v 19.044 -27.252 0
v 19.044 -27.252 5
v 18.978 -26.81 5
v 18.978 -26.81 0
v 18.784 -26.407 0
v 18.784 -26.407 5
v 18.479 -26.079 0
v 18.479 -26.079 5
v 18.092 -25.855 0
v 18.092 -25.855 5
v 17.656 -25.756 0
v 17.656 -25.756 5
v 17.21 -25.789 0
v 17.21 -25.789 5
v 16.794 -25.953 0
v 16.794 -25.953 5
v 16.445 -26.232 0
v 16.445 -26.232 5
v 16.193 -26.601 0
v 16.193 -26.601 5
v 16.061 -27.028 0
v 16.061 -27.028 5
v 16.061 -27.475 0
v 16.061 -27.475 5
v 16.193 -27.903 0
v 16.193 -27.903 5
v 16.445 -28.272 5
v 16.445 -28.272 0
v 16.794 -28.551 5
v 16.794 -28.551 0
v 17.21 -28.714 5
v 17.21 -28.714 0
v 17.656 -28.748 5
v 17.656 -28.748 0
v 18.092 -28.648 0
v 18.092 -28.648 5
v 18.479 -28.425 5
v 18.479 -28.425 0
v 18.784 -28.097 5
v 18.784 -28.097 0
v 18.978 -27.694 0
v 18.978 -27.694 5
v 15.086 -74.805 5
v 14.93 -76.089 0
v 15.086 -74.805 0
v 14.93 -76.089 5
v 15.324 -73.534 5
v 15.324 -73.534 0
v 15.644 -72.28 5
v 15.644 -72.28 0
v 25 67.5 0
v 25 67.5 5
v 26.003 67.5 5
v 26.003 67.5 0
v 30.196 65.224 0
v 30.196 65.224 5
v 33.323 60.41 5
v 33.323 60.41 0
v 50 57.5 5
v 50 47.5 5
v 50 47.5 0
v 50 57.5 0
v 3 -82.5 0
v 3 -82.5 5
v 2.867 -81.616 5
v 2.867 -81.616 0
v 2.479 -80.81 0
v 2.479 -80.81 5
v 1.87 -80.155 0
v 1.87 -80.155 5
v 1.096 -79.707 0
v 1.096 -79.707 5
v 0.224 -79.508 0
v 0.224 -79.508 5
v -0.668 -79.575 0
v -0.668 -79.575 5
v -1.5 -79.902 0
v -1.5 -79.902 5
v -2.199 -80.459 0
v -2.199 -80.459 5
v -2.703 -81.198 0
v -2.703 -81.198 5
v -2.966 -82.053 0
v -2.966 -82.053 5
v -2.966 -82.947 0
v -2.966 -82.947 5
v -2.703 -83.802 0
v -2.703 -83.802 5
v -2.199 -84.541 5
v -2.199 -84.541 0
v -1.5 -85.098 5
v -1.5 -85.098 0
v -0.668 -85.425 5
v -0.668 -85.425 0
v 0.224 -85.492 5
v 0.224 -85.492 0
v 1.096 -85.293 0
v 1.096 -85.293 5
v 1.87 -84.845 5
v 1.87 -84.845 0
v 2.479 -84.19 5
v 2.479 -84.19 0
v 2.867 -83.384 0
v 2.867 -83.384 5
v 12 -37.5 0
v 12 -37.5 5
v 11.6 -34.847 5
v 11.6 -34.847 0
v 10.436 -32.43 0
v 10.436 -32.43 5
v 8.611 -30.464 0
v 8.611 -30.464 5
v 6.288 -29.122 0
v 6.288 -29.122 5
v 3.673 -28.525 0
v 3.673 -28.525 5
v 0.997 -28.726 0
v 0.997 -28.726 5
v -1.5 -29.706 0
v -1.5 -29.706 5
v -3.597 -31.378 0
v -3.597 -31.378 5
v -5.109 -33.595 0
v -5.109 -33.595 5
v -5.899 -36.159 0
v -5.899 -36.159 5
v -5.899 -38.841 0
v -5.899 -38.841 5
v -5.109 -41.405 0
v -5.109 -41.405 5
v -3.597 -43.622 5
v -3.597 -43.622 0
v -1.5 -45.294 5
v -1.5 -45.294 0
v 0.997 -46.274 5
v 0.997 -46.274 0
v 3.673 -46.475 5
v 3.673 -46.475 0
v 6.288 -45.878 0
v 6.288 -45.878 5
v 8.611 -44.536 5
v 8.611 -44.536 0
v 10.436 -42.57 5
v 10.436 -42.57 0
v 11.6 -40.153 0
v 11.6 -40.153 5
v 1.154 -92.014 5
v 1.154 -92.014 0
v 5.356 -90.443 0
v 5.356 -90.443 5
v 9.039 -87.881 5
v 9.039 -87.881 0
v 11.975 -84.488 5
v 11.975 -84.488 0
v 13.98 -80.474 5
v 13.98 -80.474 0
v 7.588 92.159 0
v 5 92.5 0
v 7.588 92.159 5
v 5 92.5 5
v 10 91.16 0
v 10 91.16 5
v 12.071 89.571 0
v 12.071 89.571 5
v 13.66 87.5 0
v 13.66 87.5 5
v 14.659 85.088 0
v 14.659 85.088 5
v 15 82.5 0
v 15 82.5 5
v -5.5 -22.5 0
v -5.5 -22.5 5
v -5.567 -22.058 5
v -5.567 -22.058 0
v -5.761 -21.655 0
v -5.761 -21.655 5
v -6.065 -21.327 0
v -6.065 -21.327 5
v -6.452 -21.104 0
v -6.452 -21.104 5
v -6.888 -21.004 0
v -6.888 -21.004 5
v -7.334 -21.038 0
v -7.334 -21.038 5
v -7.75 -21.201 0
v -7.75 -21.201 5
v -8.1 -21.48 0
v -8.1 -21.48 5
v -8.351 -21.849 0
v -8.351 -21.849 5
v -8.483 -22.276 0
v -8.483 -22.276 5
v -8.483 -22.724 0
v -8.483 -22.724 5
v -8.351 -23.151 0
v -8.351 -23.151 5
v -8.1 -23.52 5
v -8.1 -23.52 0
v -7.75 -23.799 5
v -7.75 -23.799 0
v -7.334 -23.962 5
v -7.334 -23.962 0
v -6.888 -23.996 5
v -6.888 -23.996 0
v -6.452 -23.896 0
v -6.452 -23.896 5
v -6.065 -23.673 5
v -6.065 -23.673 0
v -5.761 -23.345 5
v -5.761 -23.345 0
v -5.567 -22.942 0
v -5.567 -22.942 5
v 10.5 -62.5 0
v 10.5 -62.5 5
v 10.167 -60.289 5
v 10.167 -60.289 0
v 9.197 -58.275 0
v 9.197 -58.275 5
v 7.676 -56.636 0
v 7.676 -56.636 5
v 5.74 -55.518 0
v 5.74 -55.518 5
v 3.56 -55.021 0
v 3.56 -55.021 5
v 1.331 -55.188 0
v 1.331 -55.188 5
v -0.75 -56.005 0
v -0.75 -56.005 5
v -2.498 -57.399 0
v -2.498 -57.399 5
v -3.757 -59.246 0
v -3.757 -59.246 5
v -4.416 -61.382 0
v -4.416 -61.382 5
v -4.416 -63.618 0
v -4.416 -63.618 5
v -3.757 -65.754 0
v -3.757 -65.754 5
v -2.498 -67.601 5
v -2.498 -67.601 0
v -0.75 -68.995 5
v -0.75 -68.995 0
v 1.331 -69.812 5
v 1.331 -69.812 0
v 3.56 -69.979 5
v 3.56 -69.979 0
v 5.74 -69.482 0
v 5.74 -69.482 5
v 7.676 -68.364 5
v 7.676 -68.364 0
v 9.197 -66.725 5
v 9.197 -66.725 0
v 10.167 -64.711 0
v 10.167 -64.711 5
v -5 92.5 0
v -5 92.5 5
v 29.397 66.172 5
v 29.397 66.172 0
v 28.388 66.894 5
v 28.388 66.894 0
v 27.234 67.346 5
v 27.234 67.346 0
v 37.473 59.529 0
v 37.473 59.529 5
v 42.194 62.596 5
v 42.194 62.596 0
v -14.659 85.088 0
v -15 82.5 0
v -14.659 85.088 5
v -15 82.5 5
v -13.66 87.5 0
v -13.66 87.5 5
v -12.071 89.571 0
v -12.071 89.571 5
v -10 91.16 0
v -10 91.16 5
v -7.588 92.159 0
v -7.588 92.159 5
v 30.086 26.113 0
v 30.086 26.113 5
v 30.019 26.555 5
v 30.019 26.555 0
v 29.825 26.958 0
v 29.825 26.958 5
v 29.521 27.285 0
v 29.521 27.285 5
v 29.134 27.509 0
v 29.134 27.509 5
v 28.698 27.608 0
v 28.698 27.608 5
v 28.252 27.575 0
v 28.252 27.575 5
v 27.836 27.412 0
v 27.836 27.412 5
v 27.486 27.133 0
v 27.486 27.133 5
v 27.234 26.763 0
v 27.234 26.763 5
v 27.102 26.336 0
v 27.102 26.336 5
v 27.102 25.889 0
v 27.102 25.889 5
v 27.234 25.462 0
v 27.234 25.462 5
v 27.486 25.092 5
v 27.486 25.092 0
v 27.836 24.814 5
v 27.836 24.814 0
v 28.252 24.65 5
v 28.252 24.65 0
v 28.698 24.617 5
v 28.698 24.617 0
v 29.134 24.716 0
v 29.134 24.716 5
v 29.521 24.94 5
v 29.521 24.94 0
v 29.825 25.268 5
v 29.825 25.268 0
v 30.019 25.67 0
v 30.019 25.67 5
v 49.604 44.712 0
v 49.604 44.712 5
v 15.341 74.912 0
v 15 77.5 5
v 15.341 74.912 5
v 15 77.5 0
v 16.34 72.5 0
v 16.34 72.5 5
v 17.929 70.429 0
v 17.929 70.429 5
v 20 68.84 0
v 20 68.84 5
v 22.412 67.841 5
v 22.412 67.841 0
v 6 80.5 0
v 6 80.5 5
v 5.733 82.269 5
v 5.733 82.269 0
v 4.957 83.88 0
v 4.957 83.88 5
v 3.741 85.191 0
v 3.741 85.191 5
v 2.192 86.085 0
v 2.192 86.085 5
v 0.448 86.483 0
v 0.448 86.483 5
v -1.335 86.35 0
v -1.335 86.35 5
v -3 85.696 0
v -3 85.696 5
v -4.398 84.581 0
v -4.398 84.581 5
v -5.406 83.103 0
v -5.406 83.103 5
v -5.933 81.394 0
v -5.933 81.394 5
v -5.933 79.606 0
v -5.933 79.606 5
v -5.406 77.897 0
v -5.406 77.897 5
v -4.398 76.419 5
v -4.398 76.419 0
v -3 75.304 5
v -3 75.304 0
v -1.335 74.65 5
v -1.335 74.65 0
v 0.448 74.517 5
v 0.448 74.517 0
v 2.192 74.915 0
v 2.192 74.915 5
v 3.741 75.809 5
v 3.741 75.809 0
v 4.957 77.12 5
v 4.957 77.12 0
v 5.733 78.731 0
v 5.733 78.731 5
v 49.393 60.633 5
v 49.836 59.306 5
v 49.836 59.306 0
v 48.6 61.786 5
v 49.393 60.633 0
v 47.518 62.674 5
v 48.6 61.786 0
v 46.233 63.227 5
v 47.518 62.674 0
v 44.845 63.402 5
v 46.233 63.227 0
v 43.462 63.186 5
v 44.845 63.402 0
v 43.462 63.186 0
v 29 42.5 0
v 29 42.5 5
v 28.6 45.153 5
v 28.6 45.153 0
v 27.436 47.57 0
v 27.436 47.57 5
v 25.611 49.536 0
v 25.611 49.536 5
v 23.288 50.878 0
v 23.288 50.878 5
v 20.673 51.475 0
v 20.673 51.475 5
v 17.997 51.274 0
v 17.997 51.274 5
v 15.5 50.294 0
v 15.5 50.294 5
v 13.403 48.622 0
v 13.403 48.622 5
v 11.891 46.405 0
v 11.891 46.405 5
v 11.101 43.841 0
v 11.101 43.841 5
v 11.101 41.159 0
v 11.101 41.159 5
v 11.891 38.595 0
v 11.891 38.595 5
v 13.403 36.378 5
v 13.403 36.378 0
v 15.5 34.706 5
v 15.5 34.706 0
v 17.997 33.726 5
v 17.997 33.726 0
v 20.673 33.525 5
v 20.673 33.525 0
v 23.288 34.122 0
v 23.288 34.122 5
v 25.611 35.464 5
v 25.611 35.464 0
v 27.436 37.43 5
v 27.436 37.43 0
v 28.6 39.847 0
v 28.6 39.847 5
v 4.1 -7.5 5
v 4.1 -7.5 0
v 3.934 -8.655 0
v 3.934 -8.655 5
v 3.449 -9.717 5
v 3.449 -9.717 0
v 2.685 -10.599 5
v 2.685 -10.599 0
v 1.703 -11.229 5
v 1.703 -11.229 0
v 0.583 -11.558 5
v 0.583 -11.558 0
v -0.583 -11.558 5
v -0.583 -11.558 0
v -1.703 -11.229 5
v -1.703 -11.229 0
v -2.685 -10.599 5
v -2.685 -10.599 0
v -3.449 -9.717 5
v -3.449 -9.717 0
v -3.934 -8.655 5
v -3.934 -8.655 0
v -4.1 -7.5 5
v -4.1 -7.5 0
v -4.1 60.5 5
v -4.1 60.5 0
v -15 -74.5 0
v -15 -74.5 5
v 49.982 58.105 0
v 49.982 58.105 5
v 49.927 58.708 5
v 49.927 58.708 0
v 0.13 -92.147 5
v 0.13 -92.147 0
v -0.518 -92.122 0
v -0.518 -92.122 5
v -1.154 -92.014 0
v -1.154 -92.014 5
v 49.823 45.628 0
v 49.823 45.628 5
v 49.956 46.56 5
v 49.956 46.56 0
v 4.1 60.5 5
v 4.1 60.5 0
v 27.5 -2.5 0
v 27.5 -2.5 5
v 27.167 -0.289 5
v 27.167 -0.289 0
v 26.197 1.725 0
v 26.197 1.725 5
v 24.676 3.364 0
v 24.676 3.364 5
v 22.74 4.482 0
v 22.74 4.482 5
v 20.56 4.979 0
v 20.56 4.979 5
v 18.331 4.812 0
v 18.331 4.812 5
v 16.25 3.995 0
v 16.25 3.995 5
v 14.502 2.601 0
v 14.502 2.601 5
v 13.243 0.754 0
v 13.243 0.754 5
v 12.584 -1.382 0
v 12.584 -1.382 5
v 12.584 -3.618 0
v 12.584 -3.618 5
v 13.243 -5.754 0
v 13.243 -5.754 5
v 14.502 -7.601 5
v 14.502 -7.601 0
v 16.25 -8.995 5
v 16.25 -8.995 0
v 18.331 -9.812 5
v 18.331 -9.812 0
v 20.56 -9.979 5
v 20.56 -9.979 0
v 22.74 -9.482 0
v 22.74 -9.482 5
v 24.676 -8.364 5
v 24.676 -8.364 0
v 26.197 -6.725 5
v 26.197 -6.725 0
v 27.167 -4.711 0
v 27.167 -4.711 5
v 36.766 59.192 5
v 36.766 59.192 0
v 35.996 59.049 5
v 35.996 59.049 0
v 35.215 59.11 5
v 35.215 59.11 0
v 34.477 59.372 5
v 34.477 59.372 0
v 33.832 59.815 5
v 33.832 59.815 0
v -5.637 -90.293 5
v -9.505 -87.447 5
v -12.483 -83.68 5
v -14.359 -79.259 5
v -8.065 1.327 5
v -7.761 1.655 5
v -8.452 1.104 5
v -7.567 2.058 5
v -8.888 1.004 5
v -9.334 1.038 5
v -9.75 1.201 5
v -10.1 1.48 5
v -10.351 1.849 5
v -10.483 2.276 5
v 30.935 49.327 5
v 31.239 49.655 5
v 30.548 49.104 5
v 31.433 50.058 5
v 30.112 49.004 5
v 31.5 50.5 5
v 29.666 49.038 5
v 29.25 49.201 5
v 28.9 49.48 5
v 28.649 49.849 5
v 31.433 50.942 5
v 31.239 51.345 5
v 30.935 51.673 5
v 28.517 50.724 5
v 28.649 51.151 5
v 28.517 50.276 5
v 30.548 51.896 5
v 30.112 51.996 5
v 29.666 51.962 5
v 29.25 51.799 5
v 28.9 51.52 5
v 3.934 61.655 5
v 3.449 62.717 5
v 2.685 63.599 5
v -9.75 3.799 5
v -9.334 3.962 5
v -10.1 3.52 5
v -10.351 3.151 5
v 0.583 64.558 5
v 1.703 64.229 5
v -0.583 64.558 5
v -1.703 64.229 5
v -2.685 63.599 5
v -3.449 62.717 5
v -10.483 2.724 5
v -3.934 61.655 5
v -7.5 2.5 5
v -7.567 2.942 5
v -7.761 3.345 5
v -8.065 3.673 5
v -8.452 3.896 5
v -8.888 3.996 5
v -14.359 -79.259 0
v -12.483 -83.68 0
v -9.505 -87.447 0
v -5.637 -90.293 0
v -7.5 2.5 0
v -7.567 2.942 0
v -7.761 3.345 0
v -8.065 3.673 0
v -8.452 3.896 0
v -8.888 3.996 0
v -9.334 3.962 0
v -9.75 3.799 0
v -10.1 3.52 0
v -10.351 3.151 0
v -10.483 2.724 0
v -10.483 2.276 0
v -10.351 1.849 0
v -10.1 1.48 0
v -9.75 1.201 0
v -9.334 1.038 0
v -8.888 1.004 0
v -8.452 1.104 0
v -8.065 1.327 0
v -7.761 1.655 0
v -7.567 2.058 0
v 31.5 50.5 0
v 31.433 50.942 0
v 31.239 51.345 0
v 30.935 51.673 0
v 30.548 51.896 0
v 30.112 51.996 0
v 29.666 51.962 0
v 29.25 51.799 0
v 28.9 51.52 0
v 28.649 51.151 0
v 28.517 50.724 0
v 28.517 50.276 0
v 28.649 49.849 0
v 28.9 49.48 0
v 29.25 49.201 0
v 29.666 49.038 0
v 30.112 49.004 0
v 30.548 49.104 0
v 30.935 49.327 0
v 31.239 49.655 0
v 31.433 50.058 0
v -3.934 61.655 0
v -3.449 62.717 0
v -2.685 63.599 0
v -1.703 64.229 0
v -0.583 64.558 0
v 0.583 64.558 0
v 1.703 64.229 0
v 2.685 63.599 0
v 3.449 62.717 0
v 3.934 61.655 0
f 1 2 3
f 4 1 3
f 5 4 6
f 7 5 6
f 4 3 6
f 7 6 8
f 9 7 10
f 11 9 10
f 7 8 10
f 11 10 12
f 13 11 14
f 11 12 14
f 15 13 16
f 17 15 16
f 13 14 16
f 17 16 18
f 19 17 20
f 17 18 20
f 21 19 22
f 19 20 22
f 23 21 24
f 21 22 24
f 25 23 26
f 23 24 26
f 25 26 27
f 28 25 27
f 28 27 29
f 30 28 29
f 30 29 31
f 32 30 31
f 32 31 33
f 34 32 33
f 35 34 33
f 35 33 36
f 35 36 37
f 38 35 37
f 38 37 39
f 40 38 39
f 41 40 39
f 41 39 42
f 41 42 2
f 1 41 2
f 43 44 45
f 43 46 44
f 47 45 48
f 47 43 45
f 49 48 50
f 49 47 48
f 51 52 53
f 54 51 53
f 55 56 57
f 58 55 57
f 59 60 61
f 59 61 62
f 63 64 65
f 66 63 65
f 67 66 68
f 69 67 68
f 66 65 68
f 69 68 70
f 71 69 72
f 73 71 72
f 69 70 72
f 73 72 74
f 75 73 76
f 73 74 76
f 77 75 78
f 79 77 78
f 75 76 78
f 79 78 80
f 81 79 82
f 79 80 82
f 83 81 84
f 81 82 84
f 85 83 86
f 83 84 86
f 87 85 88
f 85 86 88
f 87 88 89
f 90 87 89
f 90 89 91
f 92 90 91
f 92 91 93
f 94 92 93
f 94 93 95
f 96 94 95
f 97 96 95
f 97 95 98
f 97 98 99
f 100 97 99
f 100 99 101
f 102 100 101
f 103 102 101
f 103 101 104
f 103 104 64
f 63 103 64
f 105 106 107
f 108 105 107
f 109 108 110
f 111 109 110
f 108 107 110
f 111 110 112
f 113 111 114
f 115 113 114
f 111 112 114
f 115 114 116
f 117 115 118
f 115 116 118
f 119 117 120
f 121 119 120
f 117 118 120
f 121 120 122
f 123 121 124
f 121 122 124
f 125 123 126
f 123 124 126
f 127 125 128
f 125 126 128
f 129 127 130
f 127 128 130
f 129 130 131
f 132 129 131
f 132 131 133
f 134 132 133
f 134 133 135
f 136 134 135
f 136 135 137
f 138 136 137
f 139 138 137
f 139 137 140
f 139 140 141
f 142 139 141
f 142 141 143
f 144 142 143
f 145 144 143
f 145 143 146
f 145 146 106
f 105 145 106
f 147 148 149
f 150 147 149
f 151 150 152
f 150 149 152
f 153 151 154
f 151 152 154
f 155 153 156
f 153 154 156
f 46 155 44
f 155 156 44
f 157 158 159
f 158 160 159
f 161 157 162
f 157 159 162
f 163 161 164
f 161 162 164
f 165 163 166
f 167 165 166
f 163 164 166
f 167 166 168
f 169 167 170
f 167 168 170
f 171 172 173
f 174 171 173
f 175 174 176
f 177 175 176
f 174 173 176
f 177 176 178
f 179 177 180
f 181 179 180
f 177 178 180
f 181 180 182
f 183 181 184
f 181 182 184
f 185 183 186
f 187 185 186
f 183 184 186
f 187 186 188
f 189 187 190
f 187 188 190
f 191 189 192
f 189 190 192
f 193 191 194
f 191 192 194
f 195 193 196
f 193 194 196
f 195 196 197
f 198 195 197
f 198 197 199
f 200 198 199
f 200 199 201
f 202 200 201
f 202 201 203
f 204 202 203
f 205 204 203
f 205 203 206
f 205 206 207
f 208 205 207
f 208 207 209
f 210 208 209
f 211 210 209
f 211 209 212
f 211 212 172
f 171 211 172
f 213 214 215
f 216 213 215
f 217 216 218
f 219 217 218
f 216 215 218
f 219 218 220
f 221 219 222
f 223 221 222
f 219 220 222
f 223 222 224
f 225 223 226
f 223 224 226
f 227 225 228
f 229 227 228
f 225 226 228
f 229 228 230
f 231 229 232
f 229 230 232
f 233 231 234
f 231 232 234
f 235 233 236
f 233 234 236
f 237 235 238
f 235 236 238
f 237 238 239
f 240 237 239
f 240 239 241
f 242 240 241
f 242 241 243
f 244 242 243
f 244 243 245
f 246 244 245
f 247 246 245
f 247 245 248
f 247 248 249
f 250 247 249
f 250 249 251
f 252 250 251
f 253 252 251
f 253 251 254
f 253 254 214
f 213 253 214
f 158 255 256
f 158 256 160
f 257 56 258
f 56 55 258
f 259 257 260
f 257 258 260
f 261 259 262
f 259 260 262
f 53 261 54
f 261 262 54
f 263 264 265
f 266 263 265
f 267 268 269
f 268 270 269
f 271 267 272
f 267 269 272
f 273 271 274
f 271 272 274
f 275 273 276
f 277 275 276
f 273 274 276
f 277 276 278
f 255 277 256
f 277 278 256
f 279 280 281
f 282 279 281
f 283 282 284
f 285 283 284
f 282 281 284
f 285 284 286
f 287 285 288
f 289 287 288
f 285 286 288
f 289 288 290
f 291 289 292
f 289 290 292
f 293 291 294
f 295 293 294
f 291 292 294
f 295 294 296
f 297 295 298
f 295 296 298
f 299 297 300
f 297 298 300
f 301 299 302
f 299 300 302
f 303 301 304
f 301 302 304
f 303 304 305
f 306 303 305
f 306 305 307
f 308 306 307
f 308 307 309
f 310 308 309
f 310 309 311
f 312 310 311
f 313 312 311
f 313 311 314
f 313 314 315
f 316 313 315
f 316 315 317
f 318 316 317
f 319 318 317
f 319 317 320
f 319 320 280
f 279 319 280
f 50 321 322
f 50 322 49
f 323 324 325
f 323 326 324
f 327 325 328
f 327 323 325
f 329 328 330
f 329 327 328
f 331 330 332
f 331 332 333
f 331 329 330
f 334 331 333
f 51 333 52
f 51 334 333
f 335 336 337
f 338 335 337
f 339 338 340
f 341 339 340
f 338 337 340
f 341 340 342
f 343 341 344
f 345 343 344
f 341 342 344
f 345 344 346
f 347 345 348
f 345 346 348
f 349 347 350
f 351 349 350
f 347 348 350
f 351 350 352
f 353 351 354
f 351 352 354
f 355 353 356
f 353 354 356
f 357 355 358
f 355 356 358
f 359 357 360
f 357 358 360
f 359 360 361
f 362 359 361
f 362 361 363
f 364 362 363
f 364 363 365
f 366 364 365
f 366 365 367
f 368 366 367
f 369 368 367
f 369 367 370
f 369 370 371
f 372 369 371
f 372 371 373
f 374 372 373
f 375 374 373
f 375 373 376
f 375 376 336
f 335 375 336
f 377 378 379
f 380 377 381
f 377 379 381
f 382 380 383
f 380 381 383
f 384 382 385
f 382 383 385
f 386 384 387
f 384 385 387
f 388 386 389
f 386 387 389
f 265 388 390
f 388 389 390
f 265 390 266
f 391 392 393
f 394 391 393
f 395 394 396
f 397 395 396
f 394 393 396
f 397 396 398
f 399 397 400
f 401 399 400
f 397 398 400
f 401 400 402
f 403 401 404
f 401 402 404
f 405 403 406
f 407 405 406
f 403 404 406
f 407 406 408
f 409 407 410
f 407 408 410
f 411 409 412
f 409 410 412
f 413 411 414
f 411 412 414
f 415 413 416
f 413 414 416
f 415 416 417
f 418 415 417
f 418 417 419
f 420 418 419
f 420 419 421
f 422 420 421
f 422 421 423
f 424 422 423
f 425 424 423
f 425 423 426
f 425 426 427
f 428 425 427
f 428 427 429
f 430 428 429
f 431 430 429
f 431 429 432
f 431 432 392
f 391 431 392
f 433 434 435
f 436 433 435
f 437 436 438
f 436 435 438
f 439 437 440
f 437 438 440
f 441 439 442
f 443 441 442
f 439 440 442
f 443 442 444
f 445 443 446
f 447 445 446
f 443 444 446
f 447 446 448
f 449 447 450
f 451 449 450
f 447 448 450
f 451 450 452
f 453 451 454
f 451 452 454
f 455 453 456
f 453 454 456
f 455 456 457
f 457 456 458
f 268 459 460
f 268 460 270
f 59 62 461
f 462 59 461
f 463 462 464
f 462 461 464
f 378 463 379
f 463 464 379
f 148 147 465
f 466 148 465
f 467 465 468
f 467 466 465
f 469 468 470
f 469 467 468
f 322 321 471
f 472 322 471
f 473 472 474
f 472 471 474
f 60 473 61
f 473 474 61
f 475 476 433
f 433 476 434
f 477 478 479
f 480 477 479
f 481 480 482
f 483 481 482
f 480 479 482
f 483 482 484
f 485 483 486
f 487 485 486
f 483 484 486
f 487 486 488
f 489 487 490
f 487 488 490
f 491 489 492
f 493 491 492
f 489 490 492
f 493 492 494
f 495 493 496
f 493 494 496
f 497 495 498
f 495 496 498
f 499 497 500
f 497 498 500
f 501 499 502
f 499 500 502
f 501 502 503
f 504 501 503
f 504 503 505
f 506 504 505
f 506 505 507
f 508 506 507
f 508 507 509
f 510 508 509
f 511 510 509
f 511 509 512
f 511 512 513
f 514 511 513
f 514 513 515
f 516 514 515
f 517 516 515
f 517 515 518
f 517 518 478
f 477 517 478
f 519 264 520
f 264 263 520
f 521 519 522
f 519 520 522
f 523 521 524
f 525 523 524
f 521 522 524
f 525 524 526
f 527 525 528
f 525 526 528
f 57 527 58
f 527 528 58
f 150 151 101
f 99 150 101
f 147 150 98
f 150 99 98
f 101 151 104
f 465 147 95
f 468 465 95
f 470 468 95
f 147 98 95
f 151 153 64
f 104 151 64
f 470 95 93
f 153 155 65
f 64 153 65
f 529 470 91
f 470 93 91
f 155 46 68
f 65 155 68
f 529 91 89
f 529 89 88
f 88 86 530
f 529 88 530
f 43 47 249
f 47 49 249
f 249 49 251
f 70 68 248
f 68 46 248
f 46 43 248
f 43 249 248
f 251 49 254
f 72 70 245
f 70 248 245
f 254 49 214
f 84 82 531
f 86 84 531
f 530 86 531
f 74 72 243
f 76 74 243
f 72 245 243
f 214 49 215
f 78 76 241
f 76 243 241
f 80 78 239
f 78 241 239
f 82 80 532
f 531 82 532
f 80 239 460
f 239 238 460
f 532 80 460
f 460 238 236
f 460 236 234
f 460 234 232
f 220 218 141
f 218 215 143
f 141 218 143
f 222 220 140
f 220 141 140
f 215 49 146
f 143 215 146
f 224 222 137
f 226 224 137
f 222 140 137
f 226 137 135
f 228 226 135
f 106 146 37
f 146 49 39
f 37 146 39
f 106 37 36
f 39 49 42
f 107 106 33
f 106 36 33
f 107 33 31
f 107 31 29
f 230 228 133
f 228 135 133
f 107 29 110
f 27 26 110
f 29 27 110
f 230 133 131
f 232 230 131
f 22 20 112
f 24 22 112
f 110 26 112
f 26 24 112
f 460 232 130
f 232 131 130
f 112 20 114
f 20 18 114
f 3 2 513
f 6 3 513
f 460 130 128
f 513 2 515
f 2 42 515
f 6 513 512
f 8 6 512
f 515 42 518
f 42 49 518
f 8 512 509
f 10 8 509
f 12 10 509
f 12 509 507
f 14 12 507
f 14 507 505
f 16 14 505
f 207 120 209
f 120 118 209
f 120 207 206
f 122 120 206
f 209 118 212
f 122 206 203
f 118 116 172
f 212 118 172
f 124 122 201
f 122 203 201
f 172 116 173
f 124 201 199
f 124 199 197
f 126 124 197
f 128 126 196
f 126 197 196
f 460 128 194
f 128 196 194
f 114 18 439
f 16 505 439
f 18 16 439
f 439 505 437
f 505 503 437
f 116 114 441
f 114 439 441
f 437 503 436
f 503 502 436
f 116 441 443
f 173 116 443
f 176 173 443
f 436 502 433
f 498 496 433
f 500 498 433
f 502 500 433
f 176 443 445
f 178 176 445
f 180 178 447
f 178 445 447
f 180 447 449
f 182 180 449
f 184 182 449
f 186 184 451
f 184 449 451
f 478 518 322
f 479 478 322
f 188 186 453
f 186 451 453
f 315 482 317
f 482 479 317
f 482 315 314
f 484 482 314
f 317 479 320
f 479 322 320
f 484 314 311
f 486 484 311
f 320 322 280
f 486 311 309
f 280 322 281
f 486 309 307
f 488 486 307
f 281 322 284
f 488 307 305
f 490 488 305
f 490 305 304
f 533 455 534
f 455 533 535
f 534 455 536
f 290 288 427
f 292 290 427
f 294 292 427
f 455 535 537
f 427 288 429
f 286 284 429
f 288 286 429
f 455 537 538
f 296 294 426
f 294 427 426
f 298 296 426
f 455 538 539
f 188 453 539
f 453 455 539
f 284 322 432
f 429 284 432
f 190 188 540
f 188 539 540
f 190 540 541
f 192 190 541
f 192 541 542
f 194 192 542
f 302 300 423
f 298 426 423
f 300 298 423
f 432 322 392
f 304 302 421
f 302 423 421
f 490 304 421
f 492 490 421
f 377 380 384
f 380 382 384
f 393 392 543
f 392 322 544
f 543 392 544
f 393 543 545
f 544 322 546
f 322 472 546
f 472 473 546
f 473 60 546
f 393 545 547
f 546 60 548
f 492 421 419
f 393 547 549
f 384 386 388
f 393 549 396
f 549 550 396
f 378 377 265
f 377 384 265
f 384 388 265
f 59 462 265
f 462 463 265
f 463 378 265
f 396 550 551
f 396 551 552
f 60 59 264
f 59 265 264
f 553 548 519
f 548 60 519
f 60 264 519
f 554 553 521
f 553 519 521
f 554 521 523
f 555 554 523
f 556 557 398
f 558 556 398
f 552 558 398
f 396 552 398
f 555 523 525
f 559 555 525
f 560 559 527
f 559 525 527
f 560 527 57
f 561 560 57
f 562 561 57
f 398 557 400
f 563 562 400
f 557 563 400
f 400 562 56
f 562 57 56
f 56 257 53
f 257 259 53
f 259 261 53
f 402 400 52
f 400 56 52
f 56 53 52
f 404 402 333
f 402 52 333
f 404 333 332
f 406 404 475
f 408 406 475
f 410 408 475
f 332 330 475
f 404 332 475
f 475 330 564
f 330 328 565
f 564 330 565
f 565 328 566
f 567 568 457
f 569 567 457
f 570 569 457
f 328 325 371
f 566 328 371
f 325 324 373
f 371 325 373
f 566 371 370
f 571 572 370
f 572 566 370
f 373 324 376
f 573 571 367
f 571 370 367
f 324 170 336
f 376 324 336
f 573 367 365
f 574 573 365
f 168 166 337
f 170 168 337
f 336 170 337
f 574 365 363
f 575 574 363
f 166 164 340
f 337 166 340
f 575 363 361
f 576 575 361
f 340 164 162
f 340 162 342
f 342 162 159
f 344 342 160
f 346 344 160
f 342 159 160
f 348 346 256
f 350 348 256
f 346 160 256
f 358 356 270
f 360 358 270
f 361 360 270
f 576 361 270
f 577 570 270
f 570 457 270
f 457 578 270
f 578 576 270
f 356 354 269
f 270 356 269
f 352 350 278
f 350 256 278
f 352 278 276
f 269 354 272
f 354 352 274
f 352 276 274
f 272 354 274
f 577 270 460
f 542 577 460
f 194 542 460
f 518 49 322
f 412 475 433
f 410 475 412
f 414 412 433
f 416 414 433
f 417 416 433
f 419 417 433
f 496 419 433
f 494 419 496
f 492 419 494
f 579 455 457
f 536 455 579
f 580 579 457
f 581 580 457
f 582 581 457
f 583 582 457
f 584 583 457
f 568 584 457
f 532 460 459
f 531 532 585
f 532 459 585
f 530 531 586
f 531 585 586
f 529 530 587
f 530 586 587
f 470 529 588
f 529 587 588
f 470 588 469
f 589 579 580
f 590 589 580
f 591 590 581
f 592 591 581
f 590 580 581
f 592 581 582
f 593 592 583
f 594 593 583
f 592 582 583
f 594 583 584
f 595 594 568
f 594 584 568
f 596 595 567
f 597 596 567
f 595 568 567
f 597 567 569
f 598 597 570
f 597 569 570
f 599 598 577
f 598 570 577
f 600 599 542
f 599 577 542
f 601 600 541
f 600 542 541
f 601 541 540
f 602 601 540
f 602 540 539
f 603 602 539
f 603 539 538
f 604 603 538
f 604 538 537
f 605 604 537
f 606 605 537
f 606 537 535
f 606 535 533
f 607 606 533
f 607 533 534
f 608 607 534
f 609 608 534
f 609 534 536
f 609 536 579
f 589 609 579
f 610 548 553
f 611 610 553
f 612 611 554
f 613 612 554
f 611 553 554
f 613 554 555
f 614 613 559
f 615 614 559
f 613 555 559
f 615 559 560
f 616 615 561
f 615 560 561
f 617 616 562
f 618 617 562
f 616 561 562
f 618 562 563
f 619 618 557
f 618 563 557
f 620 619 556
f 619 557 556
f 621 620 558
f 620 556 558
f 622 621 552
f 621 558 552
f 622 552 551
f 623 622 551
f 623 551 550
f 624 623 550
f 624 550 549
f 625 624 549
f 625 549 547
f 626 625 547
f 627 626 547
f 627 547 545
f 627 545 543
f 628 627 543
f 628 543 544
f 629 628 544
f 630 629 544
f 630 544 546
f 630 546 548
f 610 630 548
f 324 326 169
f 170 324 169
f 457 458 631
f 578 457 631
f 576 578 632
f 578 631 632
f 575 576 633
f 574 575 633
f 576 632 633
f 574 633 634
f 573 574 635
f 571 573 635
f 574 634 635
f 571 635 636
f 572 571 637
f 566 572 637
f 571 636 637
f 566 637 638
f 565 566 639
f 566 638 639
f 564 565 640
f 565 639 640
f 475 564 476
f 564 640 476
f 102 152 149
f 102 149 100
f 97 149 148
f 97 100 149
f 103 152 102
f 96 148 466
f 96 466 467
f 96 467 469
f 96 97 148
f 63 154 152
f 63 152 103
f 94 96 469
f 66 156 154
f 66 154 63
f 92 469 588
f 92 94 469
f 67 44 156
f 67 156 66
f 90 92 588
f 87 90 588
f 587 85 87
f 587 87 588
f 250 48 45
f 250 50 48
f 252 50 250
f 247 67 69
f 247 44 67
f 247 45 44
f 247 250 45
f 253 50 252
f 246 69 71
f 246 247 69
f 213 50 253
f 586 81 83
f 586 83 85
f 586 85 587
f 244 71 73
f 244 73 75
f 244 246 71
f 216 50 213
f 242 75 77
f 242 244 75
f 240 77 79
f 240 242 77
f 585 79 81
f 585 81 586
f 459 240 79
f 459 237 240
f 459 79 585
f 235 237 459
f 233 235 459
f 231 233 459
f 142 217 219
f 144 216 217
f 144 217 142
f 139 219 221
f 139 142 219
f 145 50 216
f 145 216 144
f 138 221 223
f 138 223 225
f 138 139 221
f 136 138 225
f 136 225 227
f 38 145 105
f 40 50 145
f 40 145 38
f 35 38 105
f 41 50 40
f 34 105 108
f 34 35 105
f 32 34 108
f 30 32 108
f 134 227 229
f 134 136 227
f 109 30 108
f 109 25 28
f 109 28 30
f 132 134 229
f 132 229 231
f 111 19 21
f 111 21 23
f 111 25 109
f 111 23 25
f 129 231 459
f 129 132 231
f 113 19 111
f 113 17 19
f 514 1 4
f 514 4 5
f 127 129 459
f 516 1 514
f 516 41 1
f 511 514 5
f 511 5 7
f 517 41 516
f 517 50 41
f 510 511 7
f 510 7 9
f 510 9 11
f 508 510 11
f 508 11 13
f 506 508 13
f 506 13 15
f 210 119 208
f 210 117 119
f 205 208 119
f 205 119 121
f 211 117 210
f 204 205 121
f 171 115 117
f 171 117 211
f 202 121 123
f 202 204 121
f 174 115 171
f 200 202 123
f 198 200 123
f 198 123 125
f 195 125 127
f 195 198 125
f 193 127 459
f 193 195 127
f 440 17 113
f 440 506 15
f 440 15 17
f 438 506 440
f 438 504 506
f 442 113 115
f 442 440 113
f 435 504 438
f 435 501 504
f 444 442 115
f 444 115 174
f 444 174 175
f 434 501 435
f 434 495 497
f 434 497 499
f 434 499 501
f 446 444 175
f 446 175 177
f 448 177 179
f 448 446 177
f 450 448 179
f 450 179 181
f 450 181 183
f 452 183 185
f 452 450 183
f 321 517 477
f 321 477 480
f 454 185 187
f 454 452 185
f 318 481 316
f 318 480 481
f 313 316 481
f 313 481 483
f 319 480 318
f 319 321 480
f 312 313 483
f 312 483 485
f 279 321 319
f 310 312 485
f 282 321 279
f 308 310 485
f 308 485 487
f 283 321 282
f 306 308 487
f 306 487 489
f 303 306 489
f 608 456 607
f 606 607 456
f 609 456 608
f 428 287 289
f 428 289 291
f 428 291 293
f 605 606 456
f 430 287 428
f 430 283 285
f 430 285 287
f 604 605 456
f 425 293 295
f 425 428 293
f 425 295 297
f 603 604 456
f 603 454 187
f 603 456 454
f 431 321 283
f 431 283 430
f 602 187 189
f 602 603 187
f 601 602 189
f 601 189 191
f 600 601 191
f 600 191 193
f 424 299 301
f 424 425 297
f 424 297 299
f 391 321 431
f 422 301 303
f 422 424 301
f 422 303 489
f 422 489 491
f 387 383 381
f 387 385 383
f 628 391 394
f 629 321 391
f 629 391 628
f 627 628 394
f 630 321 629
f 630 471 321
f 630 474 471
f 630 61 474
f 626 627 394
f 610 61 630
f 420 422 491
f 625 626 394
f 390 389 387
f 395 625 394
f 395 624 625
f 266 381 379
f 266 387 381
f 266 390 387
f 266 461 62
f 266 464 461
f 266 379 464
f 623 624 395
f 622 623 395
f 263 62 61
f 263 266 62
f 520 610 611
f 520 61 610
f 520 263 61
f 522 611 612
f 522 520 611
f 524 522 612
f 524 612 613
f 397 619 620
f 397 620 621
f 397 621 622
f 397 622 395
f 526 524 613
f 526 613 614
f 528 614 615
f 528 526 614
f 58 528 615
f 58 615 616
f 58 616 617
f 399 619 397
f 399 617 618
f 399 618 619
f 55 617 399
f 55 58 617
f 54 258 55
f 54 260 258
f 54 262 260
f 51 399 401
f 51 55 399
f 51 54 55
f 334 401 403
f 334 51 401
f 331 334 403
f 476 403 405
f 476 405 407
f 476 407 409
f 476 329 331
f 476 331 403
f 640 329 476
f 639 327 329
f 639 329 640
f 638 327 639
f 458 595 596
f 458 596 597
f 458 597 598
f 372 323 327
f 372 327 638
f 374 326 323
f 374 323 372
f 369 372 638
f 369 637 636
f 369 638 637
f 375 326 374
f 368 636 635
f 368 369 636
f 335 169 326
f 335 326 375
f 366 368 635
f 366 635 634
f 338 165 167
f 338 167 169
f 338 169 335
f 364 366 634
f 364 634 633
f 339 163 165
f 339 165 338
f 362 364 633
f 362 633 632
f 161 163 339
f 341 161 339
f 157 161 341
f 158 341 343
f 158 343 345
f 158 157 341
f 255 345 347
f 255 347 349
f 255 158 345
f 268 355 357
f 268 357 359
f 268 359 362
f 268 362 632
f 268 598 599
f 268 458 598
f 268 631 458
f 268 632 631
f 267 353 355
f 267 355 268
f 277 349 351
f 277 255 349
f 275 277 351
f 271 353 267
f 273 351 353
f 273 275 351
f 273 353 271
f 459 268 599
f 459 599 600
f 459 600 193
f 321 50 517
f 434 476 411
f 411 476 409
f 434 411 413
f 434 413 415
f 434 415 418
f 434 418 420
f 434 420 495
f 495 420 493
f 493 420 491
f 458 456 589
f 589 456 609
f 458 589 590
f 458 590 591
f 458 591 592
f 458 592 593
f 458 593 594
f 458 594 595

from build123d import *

# Parameters (mm, degrees)
SKETCH_1_W          = 30
SKETCH_1_H          = 185
EXTRUDE_1_DEPTH     = 5
SKETCH_2_R          = 6
SKETCH_2_R_2        = 3
CUT_EXTRUDE_1_DEPTH = 94.841621896
FILLET_1_R          = 10
SKETCH_5_W          = 35
SKETCH_5_H          = 30
EXTRUDE_3_DEPTH     = 5
FILLET_4_R          = 10
FILLET_5_R          = 18
CUT_EXTRUDE_3_DEPTH = 5
CUT_EXTRUDE_4_DEPTH = 5
EXTRUDE_START       = -5
EXTRUDE_5_DEPTH     = 5
SKETCH_11_R         = 1.5
CUT_EXTRUDE_5_DEPTH = 106.267516357
SKETCH_12_R         = 9
SKETCH_12_R_2       = 7.5
CUT_EXTRUDE_6_DEPTH = 106.267516357
CUT_EXTRUDE_7_DEPTH = 106.267516357
FILLET_9_R          = 5
FILLET_10_R         = 3
FILLET_11_R         = 5
FILLET_12_R         = 20


with BuildPart() as part:
    # 草图1 → 凸台-拉伸1 (new body)
    with BuildSketch(Plane.XY):
        Rectangle(SKETCH_1_W, SKETCH_1_H)
    extrude(amount=EXTRUDE_1_DEPTH)

    # 草图2 → 切除-拉伸1 (cut, through all)
    with BuildSketch(Plane.XY.offset(5)):
        with Locations((0, 80.5)):
            Circle(SKETCH_2_R)
        with Locations((0, -82.5)):
            Circle(SKETCH_2_R_2)
    extrude(amount=-CUT_EXTRUDE_1_DEPTH, mode=Mode.SUBTRACT)

    # 圆角1
    fillet_1_edges = [part.edges().sort_by_distance(p)[0] for p in [
        (-15, 92.5, 2.5),
        (15, 92.5, 2.5),
    ]]
    fillet(fillet_1_edges, radius=FILLET_1_R)

    # 草图5 → 凸台-拉伸3 (add)
    with BuildSketch(Plane.XY.offset(5)):
        with Locations((32.5, 52.5)):
            Rectangle(SKETCH_5_W, SKETCH_5_H)
    extrude(amount=-EXTRUDE_3_DEPTH)

    # 圆角4
    fillet_4_edges = [part.edges().sort_by_distance(p)[0] for p in [
        (15, 37.5, 2.5),
        (15, 67.5, 2.5),
        (50, 67.5, 2.5),
        (50, 37.5, 2.5),
    ]]
    fillet(fillet_4_edges, radius=FILLET_4_R)

    # 圆角5
    # the kernel refuses this fillet: 18 mm, written as the material it takes off along each edge
    with BuildSketch(Plane(origin=(-15, -92.5, -45), x_dir=(0, 1, 0), z_dir=(0, 0, 1)), Plane(origin=(15, -92.5, -45), x_dir=(-1, 0, 0), z_dir=(0, 0, 1))) as fillet_5_piece_1:
        with BuildLine():
            CenterArc((FILLET_5_R, -FILLET_5_R), FILLET_5_R, 90, 90)
            Line((0, -FILLET_5_R), (0, 0))
            Line((0, 0), (FILLET_5_R, 0))
        make_face()
    extrude(amount=95, mode=Mode.SUBTRACT)

    # 草图8 → 切除-拉伸3 (cut)
    with BuildSketch(Plane(origin=(0, 0, 0), x_dir=(-1, 0, 0), z_dir=(0, 0, -1))):
        with BuildLine():
            Line((-4.1, 60.5), (-4.1, -7.5))
            ThreePointArc((-4.1, -7.5), (0, -11.6), (4.1, -7.5))
            Line((4.1, -7.5), (4.1, 60.5))
            ThreePointArc((4.1, 60.5), (0, 64.6), (-4.1, 60.5))
        make_face()
    extrude(amount=-CUT_EXTRUDE_3_DEPTH, mode=Mode.SUBTRACT)

    # 草图9 → 切除-拉伸4 (cut)
    with BuildSketch(Plane.XY.offset(5)):
        Polygon((22.949354722, 80.050183125), (35, 61.5), (47.495924497, 69.617653207), align=None)
    extrude(amount=-CUT_EXTRUDE_4_DEPTH, mode=Mode.SUBTRACT)

    # 草图10 → 凸台-拉伸5 (add)
    with BuildSketch(Plane.XY.offset(5).offset(EXTRUDE_START)):
        with BuildLine():
            Line((25, 37.5), (40, 37.5))
            ThreePointArc((40, 37.5), (46.005154783, 39.503868684), (49.603601244, 44.712376794))
            Line((49.603601244, 44.712376794), (15, -74.5))
            Line((15, -74.5), (15, 27.5))
            ThreePointArc((15, 27.5), (17.928932188, 34.571067812), (25, 37.5))
        make_face()
    extrude(amount=EXTRUDE_5_DEPTH)

    # 草图11 → 切除-拉伸5 (cut, through all)
    with BuildSketch(Plane.XY.offset(5)):
        with Locations((-7, -22.5)):
            Circle(SKETCH_11_R)
        with Locations((17.544259481, -27.251770883)):
            Circle(SKETCH_11_R)
        with Locations((18.828850642, -7.5)):
            Circle(SKETCH_11_R)
        with Locations((28.585531862, 26.112604356)):
            Circle(SKETCH_11_R)
        with Locations((30, 50.5)):
            Circle(SKETCH_11_R)
        with Locations((-9, 2.5)):
            Circle(SKETCH_11_R)
    extrude(amount=-CUT_EXTRUDE_5_DEPTH, mode=Mode.SUBTRACT)

    # 草图12 → 切除-拉伸6 (cut, through all)
    with BuildSketch(Plane.XY.offset(5)):
        with Locations((20, 42.5)):
            Circle(SKETCH_12_R)
        with Locations((20, -2.5)):
            Circle(SKETCH_12_R_2)
        with Locations((3, -37.5)):
            Circle(SKETCH_12_R)
        with Locations((3, -62.5)):
            Circle(SKETCH_12_R_2)
    extrude(amount=-CUT_EXTRUDE_6_DEPTH, mode=Mode.SUBTRACT)

    # 草图13 → 切除-拉伸7 (cut, through all)
    with BuildSketch(Plane.XY.offset(5)):
        Polygon((22.804344395, 76.602108744), (34.957124842, 57.894703657), (54.492950931, 70.585646319), align=None)
    extrude(amount=-CUT_EXTRUDE_7_DEPTH, mode=Mode.SUBTRACT)

    # 圆角9
    fillet_9_edges = [part.edges().sort_by_distance(p)[0] for p in [
        (46.30180901, 65.264483447, 2.5),
        (28.717293233, 67.5, 2.5),
    ]]
    fillet(fillet_9_edges, radius=FILLET_9_R)

    # 圆角10
    fillet_10_edges = [part.edges().sort_by_distance(p)[0] for p in [
        (34.957124842, 57.894703657, 2.5),
    ]]
    fillet(fillet_10_edges, radius=FILLET_10_R)

    # 圆角11
    fillet_11_edges = [part.edges().sort_by_distance(p)[0] for p in [
        (0, -92.248239349, 2.5),
    ]]
    fillet(fillet_11_edges, radius=FILLET_11_R)

    # 圆角12
    fillet_12_edges = [part.edges().sort_by_distance(p)[0] for p in [
        (15, -74.5, 2.5),
    ]]
    fillet(fillet_12_edges, radius=FILLET_12_R)


solid = part.part
